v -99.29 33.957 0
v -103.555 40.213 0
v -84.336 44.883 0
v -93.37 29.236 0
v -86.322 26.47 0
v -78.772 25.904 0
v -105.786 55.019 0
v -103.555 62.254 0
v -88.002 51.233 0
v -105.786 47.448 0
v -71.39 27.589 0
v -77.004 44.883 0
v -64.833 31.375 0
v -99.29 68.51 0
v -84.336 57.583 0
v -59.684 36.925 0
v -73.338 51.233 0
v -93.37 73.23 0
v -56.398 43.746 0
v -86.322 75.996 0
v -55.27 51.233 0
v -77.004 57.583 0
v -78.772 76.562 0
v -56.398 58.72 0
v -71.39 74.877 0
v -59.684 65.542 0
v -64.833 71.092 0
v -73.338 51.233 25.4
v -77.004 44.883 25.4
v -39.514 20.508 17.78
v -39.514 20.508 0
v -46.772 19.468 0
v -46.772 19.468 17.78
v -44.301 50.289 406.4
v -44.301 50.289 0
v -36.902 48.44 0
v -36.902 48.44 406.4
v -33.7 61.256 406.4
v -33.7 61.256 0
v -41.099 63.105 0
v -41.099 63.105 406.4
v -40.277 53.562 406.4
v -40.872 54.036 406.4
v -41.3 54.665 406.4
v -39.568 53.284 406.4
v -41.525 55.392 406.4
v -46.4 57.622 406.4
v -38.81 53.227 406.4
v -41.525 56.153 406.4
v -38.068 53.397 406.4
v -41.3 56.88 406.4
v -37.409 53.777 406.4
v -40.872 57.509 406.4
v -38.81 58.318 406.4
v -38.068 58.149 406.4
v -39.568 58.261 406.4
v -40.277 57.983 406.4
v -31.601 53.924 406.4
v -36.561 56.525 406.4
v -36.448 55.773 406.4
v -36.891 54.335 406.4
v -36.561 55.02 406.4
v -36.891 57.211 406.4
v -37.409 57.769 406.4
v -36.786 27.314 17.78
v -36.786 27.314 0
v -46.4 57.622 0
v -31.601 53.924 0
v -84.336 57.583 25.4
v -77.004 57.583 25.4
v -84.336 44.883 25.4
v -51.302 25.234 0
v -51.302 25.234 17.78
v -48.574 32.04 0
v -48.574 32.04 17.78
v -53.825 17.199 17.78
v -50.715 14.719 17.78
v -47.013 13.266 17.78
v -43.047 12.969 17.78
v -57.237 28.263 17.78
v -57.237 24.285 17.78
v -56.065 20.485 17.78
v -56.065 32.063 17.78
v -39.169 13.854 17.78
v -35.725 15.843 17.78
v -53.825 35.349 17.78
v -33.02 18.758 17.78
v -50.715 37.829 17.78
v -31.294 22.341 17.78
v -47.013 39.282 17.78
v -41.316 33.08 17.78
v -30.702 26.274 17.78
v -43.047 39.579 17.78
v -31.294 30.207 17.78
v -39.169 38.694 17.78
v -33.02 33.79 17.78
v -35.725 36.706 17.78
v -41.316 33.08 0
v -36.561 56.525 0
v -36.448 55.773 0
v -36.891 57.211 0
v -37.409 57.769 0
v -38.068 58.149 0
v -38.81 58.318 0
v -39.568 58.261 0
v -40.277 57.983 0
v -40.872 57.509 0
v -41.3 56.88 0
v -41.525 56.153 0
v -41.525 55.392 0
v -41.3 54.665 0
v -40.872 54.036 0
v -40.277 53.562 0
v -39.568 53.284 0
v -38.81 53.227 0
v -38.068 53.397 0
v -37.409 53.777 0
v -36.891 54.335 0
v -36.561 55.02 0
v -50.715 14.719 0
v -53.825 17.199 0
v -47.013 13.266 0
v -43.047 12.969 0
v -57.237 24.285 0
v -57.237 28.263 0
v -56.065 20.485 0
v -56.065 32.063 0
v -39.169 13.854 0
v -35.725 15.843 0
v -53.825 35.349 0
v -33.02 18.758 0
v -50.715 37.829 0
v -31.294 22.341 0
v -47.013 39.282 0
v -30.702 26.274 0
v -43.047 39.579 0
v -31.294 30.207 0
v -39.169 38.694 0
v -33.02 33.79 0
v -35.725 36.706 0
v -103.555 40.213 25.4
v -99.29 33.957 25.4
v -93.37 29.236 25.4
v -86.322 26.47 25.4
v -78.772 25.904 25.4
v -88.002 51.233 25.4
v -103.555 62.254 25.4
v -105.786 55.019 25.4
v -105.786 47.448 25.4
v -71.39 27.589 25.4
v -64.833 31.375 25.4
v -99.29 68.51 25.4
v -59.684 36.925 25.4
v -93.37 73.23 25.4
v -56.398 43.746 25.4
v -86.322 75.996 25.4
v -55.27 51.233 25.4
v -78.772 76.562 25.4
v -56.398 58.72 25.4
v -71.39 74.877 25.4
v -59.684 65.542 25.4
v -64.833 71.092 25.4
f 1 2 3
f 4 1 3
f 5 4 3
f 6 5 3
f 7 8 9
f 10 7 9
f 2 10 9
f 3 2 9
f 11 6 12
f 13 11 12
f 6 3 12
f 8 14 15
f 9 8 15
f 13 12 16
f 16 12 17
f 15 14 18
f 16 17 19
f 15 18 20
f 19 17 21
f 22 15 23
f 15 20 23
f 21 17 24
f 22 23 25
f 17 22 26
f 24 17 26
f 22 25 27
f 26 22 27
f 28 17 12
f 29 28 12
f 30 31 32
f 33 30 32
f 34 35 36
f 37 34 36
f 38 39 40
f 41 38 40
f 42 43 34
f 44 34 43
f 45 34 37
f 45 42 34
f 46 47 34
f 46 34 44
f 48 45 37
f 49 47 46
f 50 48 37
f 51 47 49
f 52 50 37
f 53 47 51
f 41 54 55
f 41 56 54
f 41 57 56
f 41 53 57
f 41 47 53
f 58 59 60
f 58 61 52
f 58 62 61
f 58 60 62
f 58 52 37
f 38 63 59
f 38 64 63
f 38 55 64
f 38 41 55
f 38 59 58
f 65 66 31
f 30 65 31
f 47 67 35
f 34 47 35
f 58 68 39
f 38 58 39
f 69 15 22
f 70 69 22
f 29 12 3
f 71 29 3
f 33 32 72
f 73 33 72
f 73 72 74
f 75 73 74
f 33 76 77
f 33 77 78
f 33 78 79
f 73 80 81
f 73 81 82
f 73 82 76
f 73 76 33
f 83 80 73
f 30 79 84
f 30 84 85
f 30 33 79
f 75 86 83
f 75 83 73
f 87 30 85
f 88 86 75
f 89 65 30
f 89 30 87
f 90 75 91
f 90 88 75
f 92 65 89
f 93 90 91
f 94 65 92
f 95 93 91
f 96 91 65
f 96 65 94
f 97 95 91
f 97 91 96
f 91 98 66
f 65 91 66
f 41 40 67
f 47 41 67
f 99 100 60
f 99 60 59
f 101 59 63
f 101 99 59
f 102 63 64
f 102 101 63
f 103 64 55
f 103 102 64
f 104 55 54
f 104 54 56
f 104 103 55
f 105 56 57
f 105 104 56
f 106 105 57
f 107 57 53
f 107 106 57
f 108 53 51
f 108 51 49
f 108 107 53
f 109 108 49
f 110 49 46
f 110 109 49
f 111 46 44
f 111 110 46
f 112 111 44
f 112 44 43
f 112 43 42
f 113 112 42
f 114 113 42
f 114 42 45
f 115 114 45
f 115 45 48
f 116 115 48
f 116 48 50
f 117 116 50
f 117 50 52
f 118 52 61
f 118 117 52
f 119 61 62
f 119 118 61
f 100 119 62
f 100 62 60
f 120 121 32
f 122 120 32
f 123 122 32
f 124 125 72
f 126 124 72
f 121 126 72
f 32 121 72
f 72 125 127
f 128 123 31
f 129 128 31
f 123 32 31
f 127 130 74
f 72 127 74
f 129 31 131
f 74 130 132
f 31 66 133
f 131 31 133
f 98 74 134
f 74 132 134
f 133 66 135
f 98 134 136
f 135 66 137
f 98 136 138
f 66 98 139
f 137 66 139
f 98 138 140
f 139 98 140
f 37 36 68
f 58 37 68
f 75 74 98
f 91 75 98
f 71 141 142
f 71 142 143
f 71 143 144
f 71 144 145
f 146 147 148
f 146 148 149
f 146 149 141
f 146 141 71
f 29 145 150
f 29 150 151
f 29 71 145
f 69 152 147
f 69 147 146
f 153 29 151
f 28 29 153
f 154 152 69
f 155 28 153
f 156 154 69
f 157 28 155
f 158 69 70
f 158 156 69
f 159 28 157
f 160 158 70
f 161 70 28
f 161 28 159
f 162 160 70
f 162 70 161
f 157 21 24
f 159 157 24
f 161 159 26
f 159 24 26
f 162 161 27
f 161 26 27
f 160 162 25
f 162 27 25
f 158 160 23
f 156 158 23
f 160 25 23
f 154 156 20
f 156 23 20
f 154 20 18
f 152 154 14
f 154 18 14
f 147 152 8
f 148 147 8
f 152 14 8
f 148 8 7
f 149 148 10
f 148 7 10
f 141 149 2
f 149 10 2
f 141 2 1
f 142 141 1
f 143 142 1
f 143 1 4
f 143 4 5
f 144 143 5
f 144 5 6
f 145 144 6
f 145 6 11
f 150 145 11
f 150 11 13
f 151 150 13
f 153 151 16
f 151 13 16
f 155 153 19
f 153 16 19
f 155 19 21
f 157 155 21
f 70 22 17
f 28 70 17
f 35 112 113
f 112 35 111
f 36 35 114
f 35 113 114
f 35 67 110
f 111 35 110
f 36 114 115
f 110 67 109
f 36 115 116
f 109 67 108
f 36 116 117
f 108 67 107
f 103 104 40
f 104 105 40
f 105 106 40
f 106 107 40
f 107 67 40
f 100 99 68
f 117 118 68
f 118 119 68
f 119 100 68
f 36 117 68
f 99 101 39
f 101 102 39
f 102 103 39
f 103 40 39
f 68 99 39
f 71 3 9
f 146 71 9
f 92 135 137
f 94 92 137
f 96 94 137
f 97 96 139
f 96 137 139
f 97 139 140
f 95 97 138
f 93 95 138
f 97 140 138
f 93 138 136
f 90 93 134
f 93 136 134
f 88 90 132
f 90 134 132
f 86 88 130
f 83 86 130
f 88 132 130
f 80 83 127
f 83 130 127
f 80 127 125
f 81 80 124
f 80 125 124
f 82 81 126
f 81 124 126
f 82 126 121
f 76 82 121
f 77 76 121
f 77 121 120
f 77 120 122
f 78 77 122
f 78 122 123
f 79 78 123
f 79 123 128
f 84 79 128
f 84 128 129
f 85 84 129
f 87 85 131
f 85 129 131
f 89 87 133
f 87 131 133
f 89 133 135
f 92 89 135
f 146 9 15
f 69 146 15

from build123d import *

# Parameters (mm, degrees)
F2_R     = 25.4
F3_DEPTH = 25.4
F4_R     = 2.5527
F5_DEPTH = 406.4
F6_R     = 13.3424155759
F7_DEPTH = 17.78


# Not quite as in the source:
# - a variable given as a bare number and used for a length is read in inches; the dataset says mm whatever the document's units were


with BuildPart() as f3:
    # F2 (on Top) → F3 (new body)
    with BuildSketch(Plane.XY):
        with Locations((-80.6699842215, 51.2332357466)):
            Circle(F2_R)
        Polygon((-73.3376358028, 51.2332357466), (-77.0038100121, 44.8832357466), (-84.3361584308, 44.8832357466), (-88.0023326402, 51.2332357466), (-84.3361584308, 57.5832357466), (-77.0038100121, 57.5832357466), align=None, mode=Mode.SUBTRACT)
    extrude(amount=F3_DEPTH)


with BuildPart() as f5:
    # F4 (on Top) → F5 (new body)
    with BuildSketch(Plane.XY):
        Polygon((-36.9019653495, 48.4404217775), (-31.6012177704, 53.9239544898), (-33.6997226121, 61.2563029085), (-41.098975033, 63.1051186149), (-46.3997226121, 57.6215859026), (-44.3012177704, 50.2892374839), align=None)
        with Locations((-39.0004701912, 55.7727701962)):
            Circle(F4_R, mode=Mode.SUBTRACT)
    extrude(amount=F5_DEPTH)


with BuildPart() as f7:
    # F6 (on Top) → F7 (new body)
    with BuildSketch(Plane.XY):
        with Locations((-44.0439581871, 26.2740552425)):
            Circle(F6_R)
        Polygon((-36.785788924, 27.3143976291), (-39.5139106202, 20.508467469), (-46.7720798833, 19.4681250824), (-51.3021274502, 25.233712856), (-48.5740057541, 32.0396430161), (-41.3158364909, 33.0799854026), align=None, mode=Mode.SUBTRACT)
    extrude(amount=F7_DEPTH)


solid = Compound([f3.part, f5.part, f7.part])
